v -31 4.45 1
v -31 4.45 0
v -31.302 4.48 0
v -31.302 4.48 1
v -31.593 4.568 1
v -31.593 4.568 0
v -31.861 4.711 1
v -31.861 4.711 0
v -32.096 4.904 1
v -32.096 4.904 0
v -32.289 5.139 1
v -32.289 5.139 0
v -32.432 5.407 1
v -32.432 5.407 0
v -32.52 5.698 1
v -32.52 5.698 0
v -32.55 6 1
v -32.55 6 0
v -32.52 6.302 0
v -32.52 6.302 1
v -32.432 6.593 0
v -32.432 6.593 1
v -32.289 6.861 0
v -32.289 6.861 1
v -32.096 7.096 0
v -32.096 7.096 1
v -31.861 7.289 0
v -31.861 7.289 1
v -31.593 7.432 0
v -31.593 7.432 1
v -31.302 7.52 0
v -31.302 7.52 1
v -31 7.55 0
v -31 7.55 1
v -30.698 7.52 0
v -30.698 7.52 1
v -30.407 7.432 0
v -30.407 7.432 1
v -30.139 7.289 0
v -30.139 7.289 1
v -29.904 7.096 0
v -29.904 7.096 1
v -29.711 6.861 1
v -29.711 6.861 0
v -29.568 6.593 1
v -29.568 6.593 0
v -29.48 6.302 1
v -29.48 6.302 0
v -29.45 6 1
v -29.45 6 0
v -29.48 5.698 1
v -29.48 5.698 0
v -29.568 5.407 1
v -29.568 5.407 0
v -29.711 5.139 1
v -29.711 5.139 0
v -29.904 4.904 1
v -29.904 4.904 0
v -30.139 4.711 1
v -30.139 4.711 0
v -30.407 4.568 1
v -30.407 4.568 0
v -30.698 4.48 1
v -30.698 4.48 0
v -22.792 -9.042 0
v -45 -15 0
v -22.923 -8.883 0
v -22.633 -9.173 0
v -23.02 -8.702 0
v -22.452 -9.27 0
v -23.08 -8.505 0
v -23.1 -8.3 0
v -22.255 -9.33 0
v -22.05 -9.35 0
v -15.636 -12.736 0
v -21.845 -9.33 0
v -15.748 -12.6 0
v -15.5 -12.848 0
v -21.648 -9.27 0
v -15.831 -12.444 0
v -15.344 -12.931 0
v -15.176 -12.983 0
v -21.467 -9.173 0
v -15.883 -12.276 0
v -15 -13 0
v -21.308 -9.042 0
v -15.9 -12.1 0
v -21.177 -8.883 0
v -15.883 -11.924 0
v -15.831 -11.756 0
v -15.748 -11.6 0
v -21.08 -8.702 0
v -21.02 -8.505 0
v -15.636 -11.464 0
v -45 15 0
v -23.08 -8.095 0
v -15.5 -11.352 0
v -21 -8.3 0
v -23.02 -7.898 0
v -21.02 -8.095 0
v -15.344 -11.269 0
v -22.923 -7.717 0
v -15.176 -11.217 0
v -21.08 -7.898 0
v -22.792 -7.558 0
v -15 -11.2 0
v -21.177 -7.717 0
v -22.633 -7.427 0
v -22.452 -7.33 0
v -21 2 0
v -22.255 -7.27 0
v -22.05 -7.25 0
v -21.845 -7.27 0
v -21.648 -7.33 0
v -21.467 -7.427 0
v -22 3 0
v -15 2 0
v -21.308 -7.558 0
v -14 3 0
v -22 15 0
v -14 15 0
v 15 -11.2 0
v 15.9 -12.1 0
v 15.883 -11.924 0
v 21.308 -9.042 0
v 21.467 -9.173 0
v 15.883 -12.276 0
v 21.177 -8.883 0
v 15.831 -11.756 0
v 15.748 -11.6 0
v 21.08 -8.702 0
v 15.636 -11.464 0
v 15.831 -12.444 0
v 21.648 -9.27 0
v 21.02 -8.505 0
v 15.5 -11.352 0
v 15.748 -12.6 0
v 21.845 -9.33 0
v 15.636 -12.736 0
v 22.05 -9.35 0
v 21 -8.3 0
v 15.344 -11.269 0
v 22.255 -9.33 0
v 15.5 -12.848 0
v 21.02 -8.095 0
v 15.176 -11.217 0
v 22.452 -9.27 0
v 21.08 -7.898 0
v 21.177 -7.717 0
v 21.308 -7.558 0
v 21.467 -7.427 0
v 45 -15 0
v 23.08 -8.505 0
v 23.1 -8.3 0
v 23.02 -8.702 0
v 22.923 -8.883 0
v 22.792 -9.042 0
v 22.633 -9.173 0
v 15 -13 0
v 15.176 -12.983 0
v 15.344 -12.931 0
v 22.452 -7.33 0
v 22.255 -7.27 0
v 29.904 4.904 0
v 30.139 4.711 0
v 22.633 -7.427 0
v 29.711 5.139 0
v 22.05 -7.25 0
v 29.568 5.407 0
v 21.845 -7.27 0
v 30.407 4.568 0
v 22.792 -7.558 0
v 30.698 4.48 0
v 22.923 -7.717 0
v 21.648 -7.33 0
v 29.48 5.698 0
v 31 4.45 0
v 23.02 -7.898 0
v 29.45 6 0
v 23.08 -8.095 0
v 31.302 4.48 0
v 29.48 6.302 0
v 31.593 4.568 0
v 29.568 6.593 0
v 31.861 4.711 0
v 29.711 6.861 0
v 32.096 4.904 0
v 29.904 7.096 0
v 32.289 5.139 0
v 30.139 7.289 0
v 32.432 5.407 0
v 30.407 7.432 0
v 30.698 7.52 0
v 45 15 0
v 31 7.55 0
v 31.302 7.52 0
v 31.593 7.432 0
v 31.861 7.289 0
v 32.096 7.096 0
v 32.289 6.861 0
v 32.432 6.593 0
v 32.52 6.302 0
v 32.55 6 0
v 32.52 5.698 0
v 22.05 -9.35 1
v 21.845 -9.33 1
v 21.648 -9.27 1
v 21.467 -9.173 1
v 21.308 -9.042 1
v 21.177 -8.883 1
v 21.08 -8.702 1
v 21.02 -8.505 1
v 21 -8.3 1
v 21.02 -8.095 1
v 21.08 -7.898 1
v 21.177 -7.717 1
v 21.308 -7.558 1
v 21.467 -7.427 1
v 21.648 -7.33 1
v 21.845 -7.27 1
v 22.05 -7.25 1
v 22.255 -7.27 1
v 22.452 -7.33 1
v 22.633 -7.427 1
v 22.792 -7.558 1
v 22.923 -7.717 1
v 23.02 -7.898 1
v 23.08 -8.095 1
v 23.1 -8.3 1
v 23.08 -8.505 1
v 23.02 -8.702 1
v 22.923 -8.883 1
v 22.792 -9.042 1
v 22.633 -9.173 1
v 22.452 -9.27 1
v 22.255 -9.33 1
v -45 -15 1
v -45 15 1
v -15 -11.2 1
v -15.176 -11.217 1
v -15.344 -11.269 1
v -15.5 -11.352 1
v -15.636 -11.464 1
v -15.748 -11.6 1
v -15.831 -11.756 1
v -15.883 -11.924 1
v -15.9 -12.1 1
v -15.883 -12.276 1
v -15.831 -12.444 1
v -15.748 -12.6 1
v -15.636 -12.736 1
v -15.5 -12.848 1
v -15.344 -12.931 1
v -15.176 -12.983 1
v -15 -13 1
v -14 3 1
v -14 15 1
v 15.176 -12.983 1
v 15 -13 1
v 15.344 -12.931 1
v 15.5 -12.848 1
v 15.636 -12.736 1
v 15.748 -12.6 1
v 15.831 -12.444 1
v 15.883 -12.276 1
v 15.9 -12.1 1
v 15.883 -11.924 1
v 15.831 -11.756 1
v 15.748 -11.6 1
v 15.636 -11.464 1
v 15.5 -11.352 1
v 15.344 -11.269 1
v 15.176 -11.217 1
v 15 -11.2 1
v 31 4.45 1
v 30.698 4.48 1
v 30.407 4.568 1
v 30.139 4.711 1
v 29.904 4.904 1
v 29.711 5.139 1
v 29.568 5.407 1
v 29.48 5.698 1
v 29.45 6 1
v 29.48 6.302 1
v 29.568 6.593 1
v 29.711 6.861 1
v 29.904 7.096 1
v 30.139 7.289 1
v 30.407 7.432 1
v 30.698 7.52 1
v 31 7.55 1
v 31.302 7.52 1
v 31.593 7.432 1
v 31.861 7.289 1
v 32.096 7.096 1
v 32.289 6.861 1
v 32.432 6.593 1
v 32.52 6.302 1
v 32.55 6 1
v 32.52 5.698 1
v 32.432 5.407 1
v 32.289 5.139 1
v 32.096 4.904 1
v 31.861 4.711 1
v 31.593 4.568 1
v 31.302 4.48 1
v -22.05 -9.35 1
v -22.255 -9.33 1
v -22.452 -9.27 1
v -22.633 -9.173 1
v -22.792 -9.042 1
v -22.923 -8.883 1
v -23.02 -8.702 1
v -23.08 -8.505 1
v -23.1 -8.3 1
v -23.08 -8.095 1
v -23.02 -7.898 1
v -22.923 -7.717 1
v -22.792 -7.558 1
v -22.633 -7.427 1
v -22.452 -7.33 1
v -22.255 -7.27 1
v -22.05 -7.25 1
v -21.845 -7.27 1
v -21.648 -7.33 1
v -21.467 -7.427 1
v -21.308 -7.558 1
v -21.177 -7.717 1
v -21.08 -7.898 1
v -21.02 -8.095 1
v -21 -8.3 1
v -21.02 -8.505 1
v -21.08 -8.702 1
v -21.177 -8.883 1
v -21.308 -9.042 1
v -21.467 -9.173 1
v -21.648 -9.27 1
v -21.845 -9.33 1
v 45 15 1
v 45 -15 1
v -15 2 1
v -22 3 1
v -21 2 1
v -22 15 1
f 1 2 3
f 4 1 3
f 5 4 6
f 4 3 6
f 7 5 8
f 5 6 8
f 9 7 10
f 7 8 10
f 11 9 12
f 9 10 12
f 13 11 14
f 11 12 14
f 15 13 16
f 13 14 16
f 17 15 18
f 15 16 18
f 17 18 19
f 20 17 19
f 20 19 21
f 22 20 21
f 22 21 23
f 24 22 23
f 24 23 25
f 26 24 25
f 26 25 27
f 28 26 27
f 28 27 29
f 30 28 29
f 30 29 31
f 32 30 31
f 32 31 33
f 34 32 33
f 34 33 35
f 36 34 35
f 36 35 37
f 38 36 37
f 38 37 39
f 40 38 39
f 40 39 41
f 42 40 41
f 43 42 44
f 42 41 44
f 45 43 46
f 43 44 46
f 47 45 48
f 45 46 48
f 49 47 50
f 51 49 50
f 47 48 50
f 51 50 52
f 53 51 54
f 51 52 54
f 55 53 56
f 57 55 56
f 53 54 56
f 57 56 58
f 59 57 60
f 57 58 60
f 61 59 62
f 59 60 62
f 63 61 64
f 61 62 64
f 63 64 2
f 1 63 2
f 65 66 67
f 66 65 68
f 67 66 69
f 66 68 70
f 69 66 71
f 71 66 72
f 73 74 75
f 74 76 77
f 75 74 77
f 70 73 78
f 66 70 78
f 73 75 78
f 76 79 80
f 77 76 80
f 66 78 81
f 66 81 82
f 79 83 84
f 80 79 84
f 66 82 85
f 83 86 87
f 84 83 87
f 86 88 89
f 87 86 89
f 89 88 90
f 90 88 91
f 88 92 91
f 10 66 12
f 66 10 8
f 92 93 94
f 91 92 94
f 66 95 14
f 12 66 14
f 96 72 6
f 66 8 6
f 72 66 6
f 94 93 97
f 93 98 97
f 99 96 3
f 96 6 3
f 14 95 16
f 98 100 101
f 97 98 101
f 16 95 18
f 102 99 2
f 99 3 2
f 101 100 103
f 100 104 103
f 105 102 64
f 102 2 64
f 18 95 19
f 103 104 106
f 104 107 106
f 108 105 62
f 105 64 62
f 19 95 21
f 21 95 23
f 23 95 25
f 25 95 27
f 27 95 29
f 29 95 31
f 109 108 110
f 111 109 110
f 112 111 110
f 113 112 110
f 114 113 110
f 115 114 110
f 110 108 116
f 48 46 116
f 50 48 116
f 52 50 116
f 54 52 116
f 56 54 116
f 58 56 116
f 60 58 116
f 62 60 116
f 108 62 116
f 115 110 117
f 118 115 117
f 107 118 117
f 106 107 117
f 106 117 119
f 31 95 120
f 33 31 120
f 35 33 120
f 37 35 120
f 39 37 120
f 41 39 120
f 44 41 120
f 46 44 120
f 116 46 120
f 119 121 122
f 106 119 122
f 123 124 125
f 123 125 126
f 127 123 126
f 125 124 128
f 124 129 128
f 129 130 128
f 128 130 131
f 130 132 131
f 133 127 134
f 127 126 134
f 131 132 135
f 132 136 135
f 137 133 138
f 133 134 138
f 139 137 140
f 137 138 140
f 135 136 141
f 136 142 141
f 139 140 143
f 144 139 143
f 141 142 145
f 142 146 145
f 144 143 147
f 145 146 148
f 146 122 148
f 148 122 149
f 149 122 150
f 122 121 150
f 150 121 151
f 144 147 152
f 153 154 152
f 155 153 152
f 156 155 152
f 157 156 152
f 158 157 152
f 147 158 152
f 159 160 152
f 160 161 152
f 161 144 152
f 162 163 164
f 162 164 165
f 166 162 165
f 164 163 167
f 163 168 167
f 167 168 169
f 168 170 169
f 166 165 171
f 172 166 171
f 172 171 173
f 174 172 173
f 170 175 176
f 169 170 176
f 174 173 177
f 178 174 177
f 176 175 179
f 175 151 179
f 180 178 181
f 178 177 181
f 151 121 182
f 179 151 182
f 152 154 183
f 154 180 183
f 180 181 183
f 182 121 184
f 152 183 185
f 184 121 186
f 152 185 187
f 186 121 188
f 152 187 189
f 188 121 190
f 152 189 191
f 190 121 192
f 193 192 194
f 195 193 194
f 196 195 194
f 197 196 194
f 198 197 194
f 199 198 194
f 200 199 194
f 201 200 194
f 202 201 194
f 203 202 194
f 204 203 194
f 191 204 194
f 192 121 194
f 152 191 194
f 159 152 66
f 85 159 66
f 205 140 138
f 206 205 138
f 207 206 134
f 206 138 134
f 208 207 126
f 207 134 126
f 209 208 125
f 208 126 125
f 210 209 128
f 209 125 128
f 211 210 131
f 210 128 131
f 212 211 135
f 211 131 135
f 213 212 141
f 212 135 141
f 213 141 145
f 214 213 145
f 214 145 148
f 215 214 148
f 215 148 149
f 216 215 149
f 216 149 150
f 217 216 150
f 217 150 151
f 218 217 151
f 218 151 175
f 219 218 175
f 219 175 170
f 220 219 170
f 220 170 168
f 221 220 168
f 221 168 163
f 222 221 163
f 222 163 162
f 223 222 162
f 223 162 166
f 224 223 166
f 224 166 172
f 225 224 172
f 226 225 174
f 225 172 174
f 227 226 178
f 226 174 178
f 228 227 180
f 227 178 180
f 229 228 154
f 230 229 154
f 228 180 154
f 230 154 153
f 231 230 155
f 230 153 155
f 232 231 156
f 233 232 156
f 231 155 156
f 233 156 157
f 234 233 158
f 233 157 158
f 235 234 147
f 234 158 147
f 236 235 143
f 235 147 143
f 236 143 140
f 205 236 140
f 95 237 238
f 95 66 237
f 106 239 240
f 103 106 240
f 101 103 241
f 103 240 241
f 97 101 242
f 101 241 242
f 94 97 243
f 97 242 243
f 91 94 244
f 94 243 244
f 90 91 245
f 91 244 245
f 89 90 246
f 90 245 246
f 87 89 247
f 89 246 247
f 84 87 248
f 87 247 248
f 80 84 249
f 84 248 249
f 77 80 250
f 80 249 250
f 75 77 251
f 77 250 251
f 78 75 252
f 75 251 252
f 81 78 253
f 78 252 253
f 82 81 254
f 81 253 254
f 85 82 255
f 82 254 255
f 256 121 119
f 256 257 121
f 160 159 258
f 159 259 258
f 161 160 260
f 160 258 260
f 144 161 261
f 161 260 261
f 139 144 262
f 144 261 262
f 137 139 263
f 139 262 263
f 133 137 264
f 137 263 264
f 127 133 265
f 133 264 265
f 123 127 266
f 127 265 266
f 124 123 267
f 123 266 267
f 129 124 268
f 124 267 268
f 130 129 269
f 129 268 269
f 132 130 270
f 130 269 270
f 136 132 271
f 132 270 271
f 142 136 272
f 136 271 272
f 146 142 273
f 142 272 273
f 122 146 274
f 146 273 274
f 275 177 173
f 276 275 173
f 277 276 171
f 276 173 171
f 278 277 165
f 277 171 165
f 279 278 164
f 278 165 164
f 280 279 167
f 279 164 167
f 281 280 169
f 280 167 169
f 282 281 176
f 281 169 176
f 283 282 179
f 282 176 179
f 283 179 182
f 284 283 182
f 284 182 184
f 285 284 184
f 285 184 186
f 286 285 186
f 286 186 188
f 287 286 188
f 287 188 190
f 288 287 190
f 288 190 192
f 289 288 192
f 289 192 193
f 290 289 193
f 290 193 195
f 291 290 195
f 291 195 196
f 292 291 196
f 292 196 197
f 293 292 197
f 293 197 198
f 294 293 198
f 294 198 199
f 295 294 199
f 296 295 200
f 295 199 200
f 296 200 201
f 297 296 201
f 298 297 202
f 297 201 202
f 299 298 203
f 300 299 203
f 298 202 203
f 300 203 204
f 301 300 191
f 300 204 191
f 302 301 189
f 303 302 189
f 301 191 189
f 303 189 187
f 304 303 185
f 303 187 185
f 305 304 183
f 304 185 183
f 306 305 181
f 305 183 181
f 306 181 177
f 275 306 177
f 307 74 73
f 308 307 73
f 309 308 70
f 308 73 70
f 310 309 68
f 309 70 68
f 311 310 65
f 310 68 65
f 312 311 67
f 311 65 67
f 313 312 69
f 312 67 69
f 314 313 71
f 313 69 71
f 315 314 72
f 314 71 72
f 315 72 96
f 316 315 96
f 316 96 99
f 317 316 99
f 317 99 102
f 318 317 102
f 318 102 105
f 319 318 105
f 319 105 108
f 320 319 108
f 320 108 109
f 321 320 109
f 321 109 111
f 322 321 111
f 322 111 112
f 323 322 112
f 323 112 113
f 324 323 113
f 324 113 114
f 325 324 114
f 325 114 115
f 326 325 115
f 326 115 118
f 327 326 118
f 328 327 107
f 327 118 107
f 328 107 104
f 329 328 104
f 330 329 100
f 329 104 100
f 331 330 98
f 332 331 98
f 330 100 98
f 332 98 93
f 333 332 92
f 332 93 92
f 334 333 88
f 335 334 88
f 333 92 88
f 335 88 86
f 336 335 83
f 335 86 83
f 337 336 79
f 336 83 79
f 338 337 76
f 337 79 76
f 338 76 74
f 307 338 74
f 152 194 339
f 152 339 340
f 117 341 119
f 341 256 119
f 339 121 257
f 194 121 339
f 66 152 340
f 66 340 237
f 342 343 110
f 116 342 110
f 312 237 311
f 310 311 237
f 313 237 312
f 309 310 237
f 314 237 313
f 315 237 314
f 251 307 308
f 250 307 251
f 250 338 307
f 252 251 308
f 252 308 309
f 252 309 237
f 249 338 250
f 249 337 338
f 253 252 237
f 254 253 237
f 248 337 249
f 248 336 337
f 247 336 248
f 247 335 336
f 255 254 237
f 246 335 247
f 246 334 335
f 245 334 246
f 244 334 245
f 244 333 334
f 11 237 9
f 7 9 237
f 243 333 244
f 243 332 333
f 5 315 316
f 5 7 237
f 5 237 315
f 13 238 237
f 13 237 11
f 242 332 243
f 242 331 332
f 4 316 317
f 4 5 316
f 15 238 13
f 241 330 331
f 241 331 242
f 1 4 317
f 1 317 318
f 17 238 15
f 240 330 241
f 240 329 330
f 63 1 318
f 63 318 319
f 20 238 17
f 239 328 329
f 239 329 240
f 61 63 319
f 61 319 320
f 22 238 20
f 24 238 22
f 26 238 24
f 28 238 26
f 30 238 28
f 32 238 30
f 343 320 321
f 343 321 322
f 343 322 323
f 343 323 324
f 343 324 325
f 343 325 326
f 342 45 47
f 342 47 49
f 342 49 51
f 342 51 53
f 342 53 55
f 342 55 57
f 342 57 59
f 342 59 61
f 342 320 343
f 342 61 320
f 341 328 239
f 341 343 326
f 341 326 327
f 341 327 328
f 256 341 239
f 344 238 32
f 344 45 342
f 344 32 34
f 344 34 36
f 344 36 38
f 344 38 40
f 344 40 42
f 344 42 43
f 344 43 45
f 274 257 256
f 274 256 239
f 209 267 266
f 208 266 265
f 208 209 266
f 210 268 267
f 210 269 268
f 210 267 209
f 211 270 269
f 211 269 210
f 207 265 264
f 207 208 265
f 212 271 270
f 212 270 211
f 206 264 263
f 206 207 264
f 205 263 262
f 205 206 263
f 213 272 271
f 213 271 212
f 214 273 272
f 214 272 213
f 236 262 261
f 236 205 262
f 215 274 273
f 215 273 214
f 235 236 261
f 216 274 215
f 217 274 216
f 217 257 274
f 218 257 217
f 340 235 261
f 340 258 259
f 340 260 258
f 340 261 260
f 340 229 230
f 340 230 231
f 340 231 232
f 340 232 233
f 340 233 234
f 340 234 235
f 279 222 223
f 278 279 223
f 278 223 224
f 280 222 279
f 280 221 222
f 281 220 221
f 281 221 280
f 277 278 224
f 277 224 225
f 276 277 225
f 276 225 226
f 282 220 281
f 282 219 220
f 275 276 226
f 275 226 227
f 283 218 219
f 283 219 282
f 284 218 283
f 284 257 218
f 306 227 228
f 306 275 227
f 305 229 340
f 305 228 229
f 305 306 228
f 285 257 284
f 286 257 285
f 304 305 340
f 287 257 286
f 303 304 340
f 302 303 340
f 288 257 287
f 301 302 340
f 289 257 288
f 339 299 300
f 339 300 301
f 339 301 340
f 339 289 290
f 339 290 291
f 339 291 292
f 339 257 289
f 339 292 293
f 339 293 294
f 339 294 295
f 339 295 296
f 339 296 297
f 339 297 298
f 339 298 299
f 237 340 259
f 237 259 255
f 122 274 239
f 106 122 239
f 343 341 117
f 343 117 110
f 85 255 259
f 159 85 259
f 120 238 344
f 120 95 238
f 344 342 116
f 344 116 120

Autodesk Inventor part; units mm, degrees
ref_plane "YZ Plane" through (0, 0, 0) normal (1, 0, 0) x (0, 1, 0)
ref_plane "XZ Plane" through (0, 0, 0) normal (0, 1, 0) x (-1, 0, 0)
ref_plane "XY Plane" through (0, 0, 0) normal (0, 0, 1) x (1, 0, 0)
sketch "Skizze1" plane through (0, 0, 0) normal (0, 0, 1) x (1, 0, 0)
  line L0 (-45, 15) -> (45, 15)
  line L1 (45, 15) -> (45, -15)
  line L2 (45, -15) -> (-45, -15)
  line L3 (-45, -15) -> (-45, 15)
  line L4 (-45, 15) -> (45, -15) construction
  line L5 (45, 15) -> (-45, -15) construction
  point P0 (0, 0)
  dimension "d0" = 30
  dimension "d1" = 90
extrude "Extrusion1" add sketch "Skizze1" along normal blind 1
sketch "Skizze4" plane through (0, 0, 1) normal (0, 0, 1) x (1, 0, 0)
  line L0 (15, -12.1) -> (-15, -12.1) construction
  line L1 (15, -11.2) -> (-15, -11.2)
  line L2 (-15, -13) -> (15, -13)
  arc A0 (15, -13) -> (15, -11.2) centre (15, -12.1) ccw
  arc A1 (-15, -11.2) -> (-15, -13) centre (-15, -12.1) ccw
  line L3 (0, 21) -> (0, -21) projected
  line L4 (-45, -15) -> (45, -15) projected
  point P0 (0, 0)
  point P1 (0, -12.1)
  dimension "d25" = 1.8
  dimension "d26" = 30
  dimension "d27" = 2
extrude "Extrusion2" cut sketch "Skizze4" against normal through all
sketch "Skizze2" plane through (0, 0, 1) normal (0, 0, 1) x (1, 0, 0)
  line L0 (31, 6) -> (-31, 6) construction
  line L1 (45, 15) -> (-45, 15) projected
  line L2 (0, 21) -> (0, -21) projected
  line L3 (-45, -15) -> (45, -15) projected
  dimension "d5" = 62
  dimension "d48" = 21
hole "Bohrung1" at (-31, 6, 1) at (31, 6, 1) direction (0, 0, -1) diameter 3.1 end through all
sketch "Skizze5" plane through (0, 0, 1) normal (0, 0, 1) x (1, 0, 0)
  line L0 (-45, -15) -> (45, -15) projected
  line L1 (0, 21) -> (0, -21) projected
  point P0 (0, 0)
  point P1 (22.05, -8.3)
  point P2 (-22.05, -8.3)
  dimension "d30" = 6.7
  dimension "d31" = 44.1
hole "Bohrung3" at (22.05, -8.3, 1) at (-22.05, -8.3, 1) direction (0, 0, -1) diameter 2.1 end through all
sketch "Skizze7" plane through (0, 0, 1) normal (0, 0, 1) x (1, 0, 0)
  line L0 (0, 21) -> (0, -21) projected
  line L1 (-45, -15) -> (45, -15) projected
  line L2 (-22, 15) -> (-14, 15)
  line L3 (-14, 15) -> (-14, 2)
  line L4 (-14, 2) -> (-22, 2)
  line L5 (-22, 2) -> (-22, 15)
  line L6 (-18, 2) -> (-18, 15) construction
  line L7 (45, 15) -> (-45, 15) construction
  point P0 (0, 0)
  dimension "d49" = 18
  dimension "d50" = 17
  dimension "d51" = 8
extrude "Extrusion4" cut sketch "Skizze7" against normal through all
chamfer "Fase1" distance 1 angle 45 2 edges at (-22, 2, 0.5) (-14, 2, 0.5)
properties part number "Ballsensorplatine" material "Phenolharz"
